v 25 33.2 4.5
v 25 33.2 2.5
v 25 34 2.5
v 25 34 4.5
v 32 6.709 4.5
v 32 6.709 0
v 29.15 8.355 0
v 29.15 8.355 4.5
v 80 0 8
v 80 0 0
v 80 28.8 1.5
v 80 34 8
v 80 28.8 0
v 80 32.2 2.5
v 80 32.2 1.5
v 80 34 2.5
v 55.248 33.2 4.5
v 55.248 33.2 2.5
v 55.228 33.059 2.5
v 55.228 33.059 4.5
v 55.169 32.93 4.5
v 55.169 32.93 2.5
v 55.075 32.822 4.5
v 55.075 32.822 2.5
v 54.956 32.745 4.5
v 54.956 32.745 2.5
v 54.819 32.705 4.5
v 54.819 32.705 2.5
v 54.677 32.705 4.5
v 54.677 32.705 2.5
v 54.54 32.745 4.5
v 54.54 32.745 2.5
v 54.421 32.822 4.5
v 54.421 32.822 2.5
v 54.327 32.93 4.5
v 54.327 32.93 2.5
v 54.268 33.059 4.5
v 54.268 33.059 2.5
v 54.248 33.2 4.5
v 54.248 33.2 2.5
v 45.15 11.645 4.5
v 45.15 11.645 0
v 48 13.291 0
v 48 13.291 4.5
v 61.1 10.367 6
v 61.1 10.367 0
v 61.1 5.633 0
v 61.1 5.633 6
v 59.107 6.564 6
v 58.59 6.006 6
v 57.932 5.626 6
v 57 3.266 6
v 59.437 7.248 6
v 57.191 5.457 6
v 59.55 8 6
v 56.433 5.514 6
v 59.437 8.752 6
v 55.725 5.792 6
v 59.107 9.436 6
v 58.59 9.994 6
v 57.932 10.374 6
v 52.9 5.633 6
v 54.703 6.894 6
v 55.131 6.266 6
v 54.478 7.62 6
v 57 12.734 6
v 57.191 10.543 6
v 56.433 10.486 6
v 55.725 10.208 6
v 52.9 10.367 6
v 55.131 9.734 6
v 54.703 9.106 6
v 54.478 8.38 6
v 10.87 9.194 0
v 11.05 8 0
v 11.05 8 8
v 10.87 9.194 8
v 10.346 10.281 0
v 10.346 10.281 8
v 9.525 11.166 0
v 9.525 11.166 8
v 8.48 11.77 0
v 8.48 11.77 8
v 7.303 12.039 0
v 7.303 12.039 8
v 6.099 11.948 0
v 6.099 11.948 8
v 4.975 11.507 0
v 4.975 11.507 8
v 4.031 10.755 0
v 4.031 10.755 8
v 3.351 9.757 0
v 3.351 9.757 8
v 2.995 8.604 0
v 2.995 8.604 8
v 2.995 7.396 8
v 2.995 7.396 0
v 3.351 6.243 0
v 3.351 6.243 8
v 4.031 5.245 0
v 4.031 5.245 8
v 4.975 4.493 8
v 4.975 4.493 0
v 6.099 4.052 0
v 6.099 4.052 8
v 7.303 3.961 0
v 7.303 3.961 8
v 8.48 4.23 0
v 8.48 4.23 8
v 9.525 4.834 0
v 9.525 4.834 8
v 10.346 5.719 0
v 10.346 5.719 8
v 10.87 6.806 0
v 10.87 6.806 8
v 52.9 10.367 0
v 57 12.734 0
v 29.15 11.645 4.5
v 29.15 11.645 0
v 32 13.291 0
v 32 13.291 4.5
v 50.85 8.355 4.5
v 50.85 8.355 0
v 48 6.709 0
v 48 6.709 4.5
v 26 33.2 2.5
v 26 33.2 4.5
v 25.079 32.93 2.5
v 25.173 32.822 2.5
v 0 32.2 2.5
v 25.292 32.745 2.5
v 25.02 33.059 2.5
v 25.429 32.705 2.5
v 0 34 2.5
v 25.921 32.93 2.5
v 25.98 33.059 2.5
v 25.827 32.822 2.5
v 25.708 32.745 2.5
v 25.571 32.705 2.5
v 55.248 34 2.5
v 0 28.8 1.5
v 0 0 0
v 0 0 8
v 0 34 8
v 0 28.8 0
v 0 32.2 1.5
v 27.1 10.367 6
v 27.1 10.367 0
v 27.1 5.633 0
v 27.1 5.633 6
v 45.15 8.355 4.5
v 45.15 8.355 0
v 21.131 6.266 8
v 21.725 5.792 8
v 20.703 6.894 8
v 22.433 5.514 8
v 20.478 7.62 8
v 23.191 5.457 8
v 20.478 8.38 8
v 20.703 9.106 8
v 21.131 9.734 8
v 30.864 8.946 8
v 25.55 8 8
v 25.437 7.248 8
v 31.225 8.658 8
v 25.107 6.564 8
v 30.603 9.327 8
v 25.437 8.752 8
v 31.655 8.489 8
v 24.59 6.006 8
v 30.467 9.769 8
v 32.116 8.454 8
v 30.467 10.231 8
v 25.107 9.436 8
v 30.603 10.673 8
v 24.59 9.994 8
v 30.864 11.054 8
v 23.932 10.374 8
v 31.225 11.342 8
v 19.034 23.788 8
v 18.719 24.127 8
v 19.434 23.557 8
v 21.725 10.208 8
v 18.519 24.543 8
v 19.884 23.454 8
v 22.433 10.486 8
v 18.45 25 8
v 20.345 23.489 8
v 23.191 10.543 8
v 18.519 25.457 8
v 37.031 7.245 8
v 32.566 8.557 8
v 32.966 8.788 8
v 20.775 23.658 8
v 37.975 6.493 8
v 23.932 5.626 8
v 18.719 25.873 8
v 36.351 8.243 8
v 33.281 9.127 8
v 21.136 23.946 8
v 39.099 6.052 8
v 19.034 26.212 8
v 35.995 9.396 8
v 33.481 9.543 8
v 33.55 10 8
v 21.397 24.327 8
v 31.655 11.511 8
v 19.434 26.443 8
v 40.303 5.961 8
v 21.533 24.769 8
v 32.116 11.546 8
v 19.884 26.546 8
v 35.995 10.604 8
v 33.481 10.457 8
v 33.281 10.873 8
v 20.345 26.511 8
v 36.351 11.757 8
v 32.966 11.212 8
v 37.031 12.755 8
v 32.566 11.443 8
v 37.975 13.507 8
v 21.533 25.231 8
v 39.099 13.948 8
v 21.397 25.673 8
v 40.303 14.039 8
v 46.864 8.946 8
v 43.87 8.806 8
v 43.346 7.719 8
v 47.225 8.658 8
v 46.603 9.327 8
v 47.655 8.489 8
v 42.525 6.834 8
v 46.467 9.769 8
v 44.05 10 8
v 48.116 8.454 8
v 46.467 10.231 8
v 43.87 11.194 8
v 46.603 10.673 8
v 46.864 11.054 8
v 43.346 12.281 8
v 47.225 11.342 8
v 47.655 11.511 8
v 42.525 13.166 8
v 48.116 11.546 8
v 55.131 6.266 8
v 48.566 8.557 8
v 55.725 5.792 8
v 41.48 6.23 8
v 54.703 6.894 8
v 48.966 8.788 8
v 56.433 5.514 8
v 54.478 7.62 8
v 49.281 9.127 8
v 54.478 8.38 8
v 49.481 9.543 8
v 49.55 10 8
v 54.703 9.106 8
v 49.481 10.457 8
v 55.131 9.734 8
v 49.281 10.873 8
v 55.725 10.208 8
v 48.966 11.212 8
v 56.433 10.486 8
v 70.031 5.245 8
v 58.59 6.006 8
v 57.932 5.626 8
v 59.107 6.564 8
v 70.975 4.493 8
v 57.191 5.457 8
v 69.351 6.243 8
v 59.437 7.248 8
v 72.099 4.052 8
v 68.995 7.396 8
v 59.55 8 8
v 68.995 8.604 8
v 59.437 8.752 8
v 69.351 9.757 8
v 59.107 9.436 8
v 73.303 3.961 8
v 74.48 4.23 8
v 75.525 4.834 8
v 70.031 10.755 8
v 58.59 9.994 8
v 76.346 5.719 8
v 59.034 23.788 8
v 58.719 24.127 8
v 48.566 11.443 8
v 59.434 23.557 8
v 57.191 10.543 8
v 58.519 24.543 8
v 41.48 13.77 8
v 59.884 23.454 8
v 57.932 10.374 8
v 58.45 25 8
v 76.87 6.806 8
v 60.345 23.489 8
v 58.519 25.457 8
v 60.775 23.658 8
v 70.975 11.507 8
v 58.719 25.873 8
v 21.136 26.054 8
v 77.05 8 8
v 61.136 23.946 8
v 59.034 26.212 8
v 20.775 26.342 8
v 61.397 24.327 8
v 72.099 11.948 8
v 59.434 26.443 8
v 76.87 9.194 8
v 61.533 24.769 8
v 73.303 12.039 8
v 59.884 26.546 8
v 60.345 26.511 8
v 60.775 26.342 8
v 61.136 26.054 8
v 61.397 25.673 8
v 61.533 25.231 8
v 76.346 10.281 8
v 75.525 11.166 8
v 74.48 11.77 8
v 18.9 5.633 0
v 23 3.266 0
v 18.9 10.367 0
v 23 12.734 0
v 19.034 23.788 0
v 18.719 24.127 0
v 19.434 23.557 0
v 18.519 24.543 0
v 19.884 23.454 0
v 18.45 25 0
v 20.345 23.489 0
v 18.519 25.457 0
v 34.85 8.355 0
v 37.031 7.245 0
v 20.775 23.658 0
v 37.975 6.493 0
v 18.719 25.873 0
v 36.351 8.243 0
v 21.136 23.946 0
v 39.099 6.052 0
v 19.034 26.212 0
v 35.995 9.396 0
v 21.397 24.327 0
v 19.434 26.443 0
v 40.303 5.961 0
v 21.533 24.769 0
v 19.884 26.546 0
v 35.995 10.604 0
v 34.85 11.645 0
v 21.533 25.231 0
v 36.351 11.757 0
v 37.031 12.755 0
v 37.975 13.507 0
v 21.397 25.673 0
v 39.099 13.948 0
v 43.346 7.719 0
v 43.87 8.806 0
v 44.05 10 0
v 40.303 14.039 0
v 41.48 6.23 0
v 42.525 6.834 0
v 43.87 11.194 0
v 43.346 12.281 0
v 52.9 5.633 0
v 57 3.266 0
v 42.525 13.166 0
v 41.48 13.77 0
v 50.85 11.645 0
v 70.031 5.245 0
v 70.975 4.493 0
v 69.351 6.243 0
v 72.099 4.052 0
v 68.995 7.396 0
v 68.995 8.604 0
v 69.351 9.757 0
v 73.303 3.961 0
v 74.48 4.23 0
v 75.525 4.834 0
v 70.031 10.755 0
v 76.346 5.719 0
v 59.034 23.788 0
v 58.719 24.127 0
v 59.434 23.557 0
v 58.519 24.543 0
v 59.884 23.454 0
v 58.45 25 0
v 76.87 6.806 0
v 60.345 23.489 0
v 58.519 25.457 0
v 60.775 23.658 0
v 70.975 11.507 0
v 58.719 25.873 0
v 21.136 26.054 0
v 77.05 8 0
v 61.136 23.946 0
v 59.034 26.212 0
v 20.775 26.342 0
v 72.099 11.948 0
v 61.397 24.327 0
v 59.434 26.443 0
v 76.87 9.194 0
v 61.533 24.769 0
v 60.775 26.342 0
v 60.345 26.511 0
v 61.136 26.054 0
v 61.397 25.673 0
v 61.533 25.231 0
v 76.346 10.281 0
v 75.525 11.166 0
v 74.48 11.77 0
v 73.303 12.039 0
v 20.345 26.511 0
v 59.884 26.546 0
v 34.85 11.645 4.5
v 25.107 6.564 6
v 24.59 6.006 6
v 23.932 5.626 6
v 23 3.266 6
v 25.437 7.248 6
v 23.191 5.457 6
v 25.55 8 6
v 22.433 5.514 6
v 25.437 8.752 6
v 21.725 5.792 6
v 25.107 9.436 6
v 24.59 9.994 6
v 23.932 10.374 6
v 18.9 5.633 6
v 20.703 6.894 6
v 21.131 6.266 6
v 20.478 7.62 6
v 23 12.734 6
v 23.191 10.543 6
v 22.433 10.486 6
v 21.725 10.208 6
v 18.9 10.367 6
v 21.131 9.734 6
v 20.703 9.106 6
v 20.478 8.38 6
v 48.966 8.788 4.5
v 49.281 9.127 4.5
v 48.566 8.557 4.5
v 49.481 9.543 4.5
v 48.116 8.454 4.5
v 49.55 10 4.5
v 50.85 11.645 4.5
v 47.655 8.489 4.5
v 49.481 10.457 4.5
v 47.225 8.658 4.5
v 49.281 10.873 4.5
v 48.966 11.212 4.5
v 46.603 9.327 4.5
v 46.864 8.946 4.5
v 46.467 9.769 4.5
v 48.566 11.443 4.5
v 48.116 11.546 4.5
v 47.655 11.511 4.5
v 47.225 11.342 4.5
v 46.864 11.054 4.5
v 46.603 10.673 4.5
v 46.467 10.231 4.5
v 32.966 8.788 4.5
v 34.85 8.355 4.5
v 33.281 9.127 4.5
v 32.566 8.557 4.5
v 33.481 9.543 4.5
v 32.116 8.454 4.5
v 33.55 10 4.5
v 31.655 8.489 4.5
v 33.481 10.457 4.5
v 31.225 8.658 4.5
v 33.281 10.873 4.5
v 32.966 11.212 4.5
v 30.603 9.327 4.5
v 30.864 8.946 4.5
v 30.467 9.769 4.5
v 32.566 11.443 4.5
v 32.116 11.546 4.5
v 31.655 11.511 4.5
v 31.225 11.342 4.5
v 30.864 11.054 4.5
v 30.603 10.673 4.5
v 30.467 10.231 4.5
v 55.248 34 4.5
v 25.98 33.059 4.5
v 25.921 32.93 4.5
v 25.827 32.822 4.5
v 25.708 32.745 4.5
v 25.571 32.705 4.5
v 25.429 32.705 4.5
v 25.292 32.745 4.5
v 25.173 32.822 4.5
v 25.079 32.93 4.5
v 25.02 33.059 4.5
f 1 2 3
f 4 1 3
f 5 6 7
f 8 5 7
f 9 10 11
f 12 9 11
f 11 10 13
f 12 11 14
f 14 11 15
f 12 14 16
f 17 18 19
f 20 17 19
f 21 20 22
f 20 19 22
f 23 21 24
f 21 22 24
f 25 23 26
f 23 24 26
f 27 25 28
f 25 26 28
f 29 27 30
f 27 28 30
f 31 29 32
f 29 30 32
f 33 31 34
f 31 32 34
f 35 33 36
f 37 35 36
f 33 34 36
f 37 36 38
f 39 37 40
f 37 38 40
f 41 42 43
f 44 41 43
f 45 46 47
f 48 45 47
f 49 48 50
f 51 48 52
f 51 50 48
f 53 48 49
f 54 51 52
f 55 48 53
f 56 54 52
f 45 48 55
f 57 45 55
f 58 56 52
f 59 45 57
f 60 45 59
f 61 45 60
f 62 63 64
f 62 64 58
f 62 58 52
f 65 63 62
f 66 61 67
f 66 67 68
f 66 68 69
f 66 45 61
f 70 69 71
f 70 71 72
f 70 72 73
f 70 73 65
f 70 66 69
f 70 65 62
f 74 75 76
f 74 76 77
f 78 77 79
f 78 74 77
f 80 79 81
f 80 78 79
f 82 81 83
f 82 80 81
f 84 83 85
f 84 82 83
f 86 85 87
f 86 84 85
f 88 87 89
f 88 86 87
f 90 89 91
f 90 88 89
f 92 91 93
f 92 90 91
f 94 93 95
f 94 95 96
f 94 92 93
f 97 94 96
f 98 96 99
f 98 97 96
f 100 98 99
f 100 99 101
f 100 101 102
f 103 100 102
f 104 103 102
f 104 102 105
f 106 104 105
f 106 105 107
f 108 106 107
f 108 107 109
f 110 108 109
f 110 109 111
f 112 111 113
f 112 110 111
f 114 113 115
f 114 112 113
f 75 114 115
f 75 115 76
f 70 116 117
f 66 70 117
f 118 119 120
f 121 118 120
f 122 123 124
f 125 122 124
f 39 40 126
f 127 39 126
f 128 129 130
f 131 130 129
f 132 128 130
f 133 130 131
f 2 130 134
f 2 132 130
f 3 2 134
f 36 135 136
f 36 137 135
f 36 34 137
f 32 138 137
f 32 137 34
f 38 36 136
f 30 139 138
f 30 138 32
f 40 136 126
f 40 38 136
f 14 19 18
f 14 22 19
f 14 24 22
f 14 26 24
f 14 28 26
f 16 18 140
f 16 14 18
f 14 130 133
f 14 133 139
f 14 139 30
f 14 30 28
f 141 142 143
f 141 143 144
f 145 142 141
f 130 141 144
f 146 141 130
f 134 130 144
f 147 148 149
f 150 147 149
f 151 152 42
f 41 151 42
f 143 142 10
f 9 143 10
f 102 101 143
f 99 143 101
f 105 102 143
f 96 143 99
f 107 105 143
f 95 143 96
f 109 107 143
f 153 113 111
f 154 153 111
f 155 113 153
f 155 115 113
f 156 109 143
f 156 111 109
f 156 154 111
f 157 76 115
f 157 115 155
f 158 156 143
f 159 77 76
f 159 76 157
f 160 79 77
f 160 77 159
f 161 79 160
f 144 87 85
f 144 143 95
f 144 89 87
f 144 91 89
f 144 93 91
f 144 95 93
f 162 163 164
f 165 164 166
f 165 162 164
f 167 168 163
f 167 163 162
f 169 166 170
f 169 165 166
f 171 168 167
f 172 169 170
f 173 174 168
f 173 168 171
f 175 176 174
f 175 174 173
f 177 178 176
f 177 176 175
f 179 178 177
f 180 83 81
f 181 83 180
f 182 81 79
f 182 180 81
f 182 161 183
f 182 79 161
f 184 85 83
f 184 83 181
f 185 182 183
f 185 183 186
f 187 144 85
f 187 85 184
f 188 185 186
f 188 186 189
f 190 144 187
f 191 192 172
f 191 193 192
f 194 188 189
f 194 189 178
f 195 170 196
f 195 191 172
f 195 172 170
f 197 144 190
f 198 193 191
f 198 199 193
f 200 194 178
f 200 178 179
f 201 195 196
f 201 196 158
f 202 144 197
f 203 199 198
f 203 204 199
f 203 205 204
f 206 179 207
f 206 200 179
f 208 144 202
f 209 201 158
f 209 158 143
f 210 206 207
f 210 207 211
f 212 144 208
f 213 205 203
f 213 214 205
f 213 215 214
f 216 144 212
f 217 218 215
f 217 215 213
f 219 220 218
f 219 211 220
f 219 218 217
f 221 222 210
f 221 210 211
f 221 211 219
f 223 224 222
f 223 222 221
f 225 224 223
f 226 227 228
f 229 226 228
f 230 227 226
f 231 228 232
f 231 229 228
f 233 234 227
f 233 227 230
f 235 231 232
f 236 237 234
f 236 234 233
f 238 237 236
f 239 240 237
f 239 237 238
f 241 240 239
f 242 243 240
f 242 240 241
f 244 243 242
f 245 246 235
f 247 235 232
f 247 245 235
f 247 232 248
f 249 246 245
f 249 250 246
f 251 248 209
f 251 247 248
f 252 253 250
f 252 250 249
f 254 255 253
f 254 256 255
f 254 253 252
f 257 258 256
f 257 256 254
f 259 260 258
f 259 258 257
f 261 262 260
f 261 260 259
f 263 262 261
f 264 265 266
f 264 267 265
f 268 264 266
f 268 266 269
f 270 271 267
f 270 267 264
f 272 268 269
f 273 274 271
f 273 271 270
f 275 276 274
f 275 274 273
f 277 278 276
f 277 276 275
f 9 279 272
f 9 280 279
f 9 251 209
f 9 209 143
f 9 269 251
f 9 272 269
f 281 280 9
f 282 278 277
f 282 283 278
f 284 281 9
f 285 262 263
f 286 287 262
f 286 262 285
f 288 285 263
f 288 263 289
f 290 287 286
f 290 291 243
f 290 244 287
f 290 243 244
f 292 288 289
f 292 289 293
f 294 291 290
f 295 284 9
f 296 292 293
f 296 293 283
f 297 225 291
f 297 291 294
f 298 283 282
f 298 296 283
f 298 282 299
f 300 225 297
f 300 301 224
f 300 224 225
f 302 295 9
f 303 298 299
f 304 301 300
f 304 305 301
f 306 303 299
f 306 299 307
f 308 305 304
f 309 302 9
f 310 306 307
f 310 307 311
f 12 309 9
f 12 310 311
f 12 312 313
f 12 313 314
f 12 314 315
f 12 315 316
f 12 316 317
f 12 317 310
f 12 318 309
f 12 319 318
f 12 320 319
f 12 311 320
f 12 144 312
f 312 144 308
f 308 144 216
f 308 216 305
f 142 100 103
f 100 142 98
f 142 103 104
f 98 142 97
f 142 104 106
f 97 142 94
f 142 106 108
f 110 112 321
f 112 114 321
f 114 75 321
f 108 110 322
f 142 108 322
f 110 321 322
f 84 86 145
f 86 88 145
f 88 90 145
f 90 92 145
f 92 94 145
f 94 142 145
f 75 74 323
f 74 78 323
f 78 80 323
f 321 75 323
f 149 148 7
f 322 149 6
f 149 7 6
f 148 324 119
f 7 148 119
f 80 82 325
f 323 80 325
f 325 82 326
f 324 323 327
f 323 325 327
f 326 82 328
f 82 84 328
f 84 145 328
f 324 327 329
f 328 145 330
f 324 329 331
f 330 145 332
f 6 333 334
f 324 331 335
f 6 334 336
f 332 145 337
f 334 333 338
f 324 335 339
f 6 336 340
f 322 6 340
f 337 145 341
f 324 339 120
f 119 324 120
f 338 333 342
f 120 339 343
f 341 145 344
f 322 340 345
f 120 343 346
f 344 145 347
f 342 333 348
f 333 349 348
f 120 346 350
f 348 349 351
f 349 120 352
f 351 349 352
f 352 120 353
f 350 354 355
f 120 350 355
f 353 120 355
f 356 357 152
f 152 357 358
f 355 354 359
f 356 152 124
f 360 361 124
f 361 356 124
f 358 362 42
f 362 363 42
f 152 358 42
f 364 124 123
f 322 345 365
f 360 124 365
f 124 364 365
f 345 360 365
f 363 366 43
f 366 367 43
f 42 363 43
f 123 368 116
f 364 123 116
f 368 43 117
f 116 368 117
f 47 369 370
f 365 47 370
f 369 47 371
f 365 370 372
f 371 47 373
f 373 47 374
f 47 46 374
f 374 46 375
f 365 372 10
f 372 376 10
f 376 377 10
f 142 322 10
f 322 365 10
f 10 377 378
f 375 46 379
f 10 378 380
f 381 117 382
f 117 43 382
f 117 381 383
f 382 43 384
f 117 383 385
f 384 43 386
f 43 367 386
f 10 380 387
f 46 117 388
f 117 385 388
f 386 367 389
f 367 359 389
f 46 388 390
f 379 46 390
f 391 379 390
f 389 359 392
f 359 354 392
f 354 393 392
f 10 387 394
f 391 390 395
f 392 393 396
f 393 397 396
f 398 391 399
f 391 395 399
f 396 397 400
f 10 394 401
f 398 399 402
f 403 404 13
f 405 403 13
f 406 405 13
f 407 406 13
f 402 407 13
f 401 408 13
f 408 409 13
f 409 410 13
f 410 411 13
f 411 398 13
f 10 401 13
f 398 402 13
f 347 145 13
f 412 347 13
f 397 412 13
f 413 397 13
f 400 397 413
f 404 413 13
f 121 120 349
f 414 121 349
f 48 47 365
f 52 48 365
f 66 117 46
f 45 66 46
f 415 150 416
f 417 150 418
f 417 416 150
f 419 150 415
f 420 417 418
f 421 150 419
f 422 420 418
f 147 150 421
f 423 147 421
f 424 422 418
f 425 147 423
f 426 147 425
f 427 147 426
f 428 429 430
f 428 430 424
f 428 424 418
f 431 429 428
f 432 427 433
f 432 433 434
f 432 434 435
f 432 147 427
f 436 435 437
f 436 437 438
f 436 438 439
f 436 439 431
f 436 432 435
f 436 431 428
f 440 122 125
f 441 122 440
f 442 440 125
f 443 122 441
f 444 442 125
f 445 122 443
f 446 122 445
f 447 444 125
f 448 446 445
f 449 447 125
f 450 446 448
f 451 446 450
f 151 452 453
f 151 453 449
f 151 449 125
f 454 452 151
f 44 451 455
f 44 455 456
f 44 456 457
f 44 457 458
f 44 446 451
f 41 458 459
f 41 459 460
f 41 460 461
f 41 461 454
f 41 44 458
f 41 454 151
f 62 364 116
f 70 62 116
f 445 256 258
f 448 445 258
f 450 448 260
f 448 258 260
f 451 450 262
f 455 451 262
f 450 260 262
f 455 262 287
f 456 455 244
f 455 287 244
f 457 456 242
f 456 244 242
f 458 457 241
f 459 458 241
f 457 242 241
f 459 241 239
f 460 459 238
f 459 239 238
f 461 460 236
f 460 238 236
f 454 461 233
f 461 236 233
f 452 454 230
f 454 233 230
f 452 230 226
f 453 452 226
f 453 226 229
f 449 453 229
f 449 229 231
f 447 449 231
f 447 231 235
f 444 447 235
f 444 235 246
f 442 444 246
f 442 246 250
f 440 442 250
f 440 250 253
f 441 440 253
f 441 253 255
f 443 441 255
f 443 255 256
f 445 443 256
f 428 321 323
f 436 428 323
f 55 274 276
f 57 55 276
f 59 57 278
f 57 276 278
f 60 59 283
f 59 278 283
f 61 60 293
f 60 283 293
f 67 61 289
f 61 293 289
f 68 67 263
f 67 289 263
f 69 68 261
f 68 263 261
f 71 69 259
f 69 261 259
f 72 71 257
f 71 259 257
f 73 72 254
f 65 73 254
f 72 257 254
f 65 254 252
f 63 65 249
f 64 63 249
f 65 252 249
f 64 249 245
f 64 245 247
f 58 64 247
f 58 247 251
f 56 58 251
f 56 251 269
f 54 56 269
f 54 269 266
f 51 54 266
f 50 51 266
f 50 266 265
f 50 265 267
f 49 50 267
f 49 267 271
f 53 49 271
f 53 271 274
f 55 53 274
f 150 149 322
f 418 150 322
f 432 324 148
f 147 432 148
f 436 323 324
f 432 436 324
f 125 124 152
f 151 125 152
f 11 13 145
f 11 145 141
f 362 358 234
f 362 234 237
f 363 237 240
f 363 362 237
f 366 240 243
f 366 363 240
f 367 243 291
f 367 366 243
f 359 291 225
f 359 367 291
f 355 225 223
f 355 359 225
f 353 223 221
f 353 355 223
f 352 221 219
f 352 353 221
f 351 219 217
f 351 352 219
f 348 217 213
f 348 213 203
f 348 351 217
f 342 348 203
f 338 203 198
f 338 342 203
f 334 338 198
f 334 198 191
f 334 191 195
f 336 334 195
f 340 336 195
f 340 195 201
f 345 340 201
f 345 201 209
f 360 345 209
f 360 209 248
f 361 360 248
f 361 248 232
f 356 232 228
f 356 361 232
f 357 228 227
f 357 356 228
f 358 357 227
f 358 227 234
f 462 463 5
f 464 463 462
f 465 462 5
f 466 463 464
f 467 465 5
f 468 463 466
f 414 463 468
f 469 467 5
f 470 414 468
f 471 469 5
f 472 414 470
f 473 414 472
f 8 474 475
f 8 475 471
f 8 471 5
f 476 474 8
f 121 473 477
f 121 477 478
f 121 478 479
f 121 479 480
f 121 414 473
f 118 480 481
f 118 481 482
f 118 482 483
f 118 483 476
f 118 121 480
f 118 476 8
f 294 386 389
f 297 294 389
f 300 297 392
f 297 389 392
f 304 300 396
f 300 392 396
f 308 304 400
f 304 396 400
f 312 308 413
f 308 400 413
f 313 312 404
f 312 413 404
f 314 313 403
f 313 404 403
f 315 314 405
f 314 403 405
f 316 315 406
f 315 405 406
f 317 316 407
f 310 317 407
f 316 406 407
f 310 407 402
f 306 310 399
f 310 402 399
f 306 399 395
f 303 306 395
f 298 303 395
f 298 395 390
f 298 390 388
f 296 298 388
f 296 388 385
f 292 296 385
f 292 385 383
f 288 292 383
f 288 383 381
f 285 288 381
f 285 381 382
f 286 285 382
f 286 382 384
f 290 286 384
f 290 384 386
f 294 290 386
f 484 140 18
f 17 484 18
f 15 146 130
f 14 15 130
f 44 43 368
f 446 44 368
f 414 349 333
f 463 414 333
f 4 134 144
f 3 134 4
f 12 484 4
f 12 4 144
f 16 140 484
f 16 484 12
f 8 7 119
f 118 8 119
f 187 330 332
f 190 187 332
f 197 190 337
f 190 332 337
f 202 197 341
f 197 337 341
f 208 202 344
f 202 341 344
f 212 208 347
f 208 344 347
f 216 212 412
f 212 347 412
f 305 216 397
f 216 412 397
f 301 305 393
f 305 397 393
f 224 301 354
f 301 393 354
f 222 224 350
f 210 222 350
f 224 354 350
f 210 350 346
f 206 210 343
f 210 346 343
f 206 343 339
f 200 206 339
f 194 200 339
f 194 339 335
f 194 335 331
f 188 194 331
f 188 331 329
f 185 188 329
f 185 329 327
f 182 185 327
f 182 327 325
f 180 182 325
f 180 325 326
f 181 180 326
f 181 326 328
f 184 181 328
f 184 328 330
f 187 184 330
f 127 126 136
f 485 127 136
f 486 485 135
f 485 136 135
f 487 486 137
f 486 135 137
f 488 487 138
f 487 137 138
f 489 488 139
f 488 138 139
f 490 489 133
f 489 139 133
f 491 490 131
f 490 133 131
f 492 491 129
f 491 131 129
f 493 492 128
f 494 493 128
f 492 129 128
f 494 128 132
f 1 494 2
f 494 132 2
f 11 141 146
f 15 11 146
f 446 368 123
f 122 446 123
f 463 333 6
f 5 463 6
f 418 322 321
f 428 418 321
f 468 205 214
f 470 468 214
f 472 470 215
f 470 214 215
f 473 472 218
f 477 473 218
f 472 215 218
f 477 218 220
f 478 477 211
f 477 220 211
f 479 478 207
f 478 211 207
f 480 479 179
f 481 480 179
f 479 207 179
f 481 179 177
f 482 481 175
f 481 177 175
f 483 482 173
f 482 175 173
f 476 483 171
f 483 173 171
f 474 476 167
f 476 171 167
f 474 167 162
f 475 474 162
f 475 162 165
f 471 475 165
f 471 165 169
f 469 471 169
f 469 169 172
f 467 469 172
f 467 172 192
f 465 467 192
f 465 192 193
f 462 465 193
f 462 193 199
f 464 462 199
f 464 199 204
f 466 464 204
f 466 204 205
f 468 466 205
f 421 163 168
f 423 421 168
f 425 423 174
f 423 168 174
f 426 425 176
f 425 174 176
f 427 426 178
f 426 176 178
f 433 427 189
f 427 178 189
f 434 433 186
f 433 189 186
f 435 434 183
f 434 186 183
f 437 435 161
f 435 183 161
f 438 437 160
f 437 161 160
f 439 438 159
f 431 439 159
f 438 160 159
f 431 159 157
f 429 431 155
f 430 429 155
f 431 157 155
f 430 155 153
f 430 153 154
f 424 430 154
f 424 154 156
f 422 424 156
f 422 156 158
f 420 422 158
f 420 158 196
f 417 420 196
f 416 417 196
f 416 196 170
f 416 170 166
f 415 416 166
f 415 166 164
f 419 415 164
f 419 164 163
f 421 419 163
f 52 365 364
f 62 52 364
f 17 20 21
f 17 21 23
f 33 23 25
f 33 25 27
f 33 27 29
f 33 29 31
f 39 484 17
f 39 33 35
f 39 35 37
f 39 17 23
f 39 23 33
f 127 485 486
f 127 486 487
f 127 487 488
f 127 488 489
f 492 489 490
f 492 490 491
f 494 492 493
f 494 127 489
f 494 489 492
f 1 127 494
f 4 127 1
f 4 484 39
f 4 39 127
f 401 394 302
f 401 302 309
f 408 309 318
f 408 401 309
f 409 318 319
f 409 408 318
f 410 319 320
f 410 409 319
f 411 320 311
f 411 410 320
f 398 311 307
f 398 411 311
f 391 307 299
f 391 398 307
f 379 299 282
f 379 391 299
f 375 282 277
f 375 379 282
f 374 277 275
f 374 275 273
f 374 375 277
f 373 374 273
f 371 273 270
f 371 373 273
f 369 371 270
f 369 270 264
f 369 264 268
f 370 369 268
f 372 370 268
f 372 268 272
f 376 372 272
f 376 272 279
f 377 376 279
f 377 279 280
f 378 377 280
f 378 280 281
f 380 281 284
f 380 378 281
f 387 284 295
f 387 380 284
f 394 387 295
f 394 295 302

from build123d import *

# Parameters (mm, degrees)
SKETCH_2_W           = 80
SKETCH_2_H           = 34
SKETCH_2_R           = 4.05
EXTRUDE_1_DEPTH      = 8
SKETCH_3_R           = 2.55
CUT_EXTRUDE_1_DEPTH  = 88.292611371
CUT_EXTRUDE_2_DEPTH  = 88.292611371
SKETCH_5_R           = 1.55
CUT_EXTRUDE_3_DEPTH  = 88.292611371
CUT_EXTRUDE_5_DEPTH  = 4.5
SKETCH_11_R          = 1.55
CUT_EXTRUDE_7_DEPTH  = 88.292611371
CUT_EXTRUDE_11_DEPTH = 2
CUT_EXTRUDE_13_DEPTH = 6


with BuildPart() as part:
    # 草图2 → 凸台-拉伸1 (new body)
    with BuildSketch(Plane.XY):
        with Locations((40, 17)):
            Rectangle(SKETCH_2_W, SKETCH_2_H)
        with Locations((7, 8)):
            Circle(SKETCH_2_R, mode=Mode.SUBTRACT)
        with Locations((40, 10)):
            Circle(SKETCH_2_R, mode=Mode.SUBTRACT)
        with Locations((73, 8)):
            Circle(SKETCH_2_R, mode=Mode.SUBTRACT)
    extrude(amount=EXTRUDE_1_DEPTH)

    # 草图3 → 切除-拉伸1 (cut, through all)
    with BuildSketch(Plane.XY.offset(8)):
        with Locations((23, 8)):
            Circle(SKETCH_3_R)
        with Locations((57, 8)):
            Circle(SKETCH_3_R)
    extrude(amount=-CUT_EXTRUDE_1_DEPTH, mode=Mode.SUBTRACT)

    # 草图4 → 切除-拉伸2 (cut, through all)
    with BuildSketch(Plane(origin=(80, 0, 0), x_dir=(0, 0, -1), z_dir=(1, 0, 0))):
        Polygon((-1.5, 32.2), (-2.5, 32.2), (-2.5, 34), (0, 34), (0, 28.8), (-1.5, 28.8), align=None)
    extrude(amount=-CUT_EXTRUDE_2_DEPTH, mode=Mode.SUBTRACT)

    # 草图5 → 切除-拉伸3 (cut, through all)
    with BuildSketch(Plane.XY.offset(8)):
        with Locations((48, 10)):
            Circle(SKETCH_5_R)
        with Locations((32, 10)):
            Circle(SKETCH_5_R)
    extrude(amount=-CUT_EXTRUDE_3_DEPTH, mode=Mode.SUBTRACT)

    # 草图8 → 切除-拉伸5 (cut)
    with BuildSketch(Plane(origin=(0, 0, 0), x_dir=(-1, 0, 0), z_dir=(0, 0, -1))):
        Polygon((-45.15, 8.354551733), (-45.15, 11.645448267), (-48, 13.290896534), (-50.85, 11.645448267), (-50.85, 8.354551733), (-48, 6.709103466), align=None)
        Polygon((-29.15, 8.354551733), (-29.15, 11.645448267), (-32, 13.290896534), (-34.85, 11.645448267), (-34.85, 8.354551733), (-32, 6.709103466), align=None)
    extrude(amount=-CUT_EXTRUDE_5_DEPTH, mode=Mode.SUBTRACT)

    # 草图11 → 切除-拉伸7 (cut, through all)
    with BuildSketch(Plane(origin=(0, 0, 0), x_dir=(-1, 0, 0), z_dir=(0, 0, -1))):
        with Locations((-60, 25)):
            Circle(SKETCH_11_R)
        with Locations((-20, 25)):
            Circle(SKETCH_11_R)
    extrude(amount=-CUT_EXTRUDE_7_DEPTH, mode=Mode.SUBTRACT)

    # 草图19 → 切除-拉伸11 (cut)
    with BuildSketch(Plane(origin=(0, 0, 2.5), x_dir=(-1, 0, 0), z_dir=(0, 0, -1))):
        with BuildLine():
            Line((-25, 34), (-55.247938178, 34))
            Line((-55.247938178, 34), (-55.247938178, 33.2))
            ThreePointArc((-55.247938178, 33.2), (-54.747938178, 32.7), (-54.247938178, 33.2))
            Line((-54.247938178, 33.2), (-26, 33.2))
            ThreePointArc((-26, 33.2), (-25.5, 32.7), (-25, 33.2))
            Line((-25, 33.2), (-25, 34))
        make_face()
    extrude(amount=-CUT_EXTRUDE_11_DEPTH, mode=Mode.SUBTRACT)

    # 草图7 → 切除-拉伸13 (cut)
    with BuildSketch(Plane(origin=(0, 0, 0), x_dir=(-1, 0, 0), z_dir=(0, 0, -1))):
        Polygon((-52.9, 5.632863896), (-52.9, 10.367136104), (-57, 12.734272207), (-61.1, 10.367136104), (-61.1, 5.632863896), (-57, 3.265727793), align=None)
        Polygon((-18.9, 5.632863896), (-18.9, 10.367136104), (-23, 12.734272207), (-27.1, 10.367136104), (-27.1, 5.632863896), (-23, 3.265727793), align=None)
    extrude(amount=-CUT_EXTRUDE_13_DEPTH, mode=Mode.SUBTRACT)


solid = part.part
